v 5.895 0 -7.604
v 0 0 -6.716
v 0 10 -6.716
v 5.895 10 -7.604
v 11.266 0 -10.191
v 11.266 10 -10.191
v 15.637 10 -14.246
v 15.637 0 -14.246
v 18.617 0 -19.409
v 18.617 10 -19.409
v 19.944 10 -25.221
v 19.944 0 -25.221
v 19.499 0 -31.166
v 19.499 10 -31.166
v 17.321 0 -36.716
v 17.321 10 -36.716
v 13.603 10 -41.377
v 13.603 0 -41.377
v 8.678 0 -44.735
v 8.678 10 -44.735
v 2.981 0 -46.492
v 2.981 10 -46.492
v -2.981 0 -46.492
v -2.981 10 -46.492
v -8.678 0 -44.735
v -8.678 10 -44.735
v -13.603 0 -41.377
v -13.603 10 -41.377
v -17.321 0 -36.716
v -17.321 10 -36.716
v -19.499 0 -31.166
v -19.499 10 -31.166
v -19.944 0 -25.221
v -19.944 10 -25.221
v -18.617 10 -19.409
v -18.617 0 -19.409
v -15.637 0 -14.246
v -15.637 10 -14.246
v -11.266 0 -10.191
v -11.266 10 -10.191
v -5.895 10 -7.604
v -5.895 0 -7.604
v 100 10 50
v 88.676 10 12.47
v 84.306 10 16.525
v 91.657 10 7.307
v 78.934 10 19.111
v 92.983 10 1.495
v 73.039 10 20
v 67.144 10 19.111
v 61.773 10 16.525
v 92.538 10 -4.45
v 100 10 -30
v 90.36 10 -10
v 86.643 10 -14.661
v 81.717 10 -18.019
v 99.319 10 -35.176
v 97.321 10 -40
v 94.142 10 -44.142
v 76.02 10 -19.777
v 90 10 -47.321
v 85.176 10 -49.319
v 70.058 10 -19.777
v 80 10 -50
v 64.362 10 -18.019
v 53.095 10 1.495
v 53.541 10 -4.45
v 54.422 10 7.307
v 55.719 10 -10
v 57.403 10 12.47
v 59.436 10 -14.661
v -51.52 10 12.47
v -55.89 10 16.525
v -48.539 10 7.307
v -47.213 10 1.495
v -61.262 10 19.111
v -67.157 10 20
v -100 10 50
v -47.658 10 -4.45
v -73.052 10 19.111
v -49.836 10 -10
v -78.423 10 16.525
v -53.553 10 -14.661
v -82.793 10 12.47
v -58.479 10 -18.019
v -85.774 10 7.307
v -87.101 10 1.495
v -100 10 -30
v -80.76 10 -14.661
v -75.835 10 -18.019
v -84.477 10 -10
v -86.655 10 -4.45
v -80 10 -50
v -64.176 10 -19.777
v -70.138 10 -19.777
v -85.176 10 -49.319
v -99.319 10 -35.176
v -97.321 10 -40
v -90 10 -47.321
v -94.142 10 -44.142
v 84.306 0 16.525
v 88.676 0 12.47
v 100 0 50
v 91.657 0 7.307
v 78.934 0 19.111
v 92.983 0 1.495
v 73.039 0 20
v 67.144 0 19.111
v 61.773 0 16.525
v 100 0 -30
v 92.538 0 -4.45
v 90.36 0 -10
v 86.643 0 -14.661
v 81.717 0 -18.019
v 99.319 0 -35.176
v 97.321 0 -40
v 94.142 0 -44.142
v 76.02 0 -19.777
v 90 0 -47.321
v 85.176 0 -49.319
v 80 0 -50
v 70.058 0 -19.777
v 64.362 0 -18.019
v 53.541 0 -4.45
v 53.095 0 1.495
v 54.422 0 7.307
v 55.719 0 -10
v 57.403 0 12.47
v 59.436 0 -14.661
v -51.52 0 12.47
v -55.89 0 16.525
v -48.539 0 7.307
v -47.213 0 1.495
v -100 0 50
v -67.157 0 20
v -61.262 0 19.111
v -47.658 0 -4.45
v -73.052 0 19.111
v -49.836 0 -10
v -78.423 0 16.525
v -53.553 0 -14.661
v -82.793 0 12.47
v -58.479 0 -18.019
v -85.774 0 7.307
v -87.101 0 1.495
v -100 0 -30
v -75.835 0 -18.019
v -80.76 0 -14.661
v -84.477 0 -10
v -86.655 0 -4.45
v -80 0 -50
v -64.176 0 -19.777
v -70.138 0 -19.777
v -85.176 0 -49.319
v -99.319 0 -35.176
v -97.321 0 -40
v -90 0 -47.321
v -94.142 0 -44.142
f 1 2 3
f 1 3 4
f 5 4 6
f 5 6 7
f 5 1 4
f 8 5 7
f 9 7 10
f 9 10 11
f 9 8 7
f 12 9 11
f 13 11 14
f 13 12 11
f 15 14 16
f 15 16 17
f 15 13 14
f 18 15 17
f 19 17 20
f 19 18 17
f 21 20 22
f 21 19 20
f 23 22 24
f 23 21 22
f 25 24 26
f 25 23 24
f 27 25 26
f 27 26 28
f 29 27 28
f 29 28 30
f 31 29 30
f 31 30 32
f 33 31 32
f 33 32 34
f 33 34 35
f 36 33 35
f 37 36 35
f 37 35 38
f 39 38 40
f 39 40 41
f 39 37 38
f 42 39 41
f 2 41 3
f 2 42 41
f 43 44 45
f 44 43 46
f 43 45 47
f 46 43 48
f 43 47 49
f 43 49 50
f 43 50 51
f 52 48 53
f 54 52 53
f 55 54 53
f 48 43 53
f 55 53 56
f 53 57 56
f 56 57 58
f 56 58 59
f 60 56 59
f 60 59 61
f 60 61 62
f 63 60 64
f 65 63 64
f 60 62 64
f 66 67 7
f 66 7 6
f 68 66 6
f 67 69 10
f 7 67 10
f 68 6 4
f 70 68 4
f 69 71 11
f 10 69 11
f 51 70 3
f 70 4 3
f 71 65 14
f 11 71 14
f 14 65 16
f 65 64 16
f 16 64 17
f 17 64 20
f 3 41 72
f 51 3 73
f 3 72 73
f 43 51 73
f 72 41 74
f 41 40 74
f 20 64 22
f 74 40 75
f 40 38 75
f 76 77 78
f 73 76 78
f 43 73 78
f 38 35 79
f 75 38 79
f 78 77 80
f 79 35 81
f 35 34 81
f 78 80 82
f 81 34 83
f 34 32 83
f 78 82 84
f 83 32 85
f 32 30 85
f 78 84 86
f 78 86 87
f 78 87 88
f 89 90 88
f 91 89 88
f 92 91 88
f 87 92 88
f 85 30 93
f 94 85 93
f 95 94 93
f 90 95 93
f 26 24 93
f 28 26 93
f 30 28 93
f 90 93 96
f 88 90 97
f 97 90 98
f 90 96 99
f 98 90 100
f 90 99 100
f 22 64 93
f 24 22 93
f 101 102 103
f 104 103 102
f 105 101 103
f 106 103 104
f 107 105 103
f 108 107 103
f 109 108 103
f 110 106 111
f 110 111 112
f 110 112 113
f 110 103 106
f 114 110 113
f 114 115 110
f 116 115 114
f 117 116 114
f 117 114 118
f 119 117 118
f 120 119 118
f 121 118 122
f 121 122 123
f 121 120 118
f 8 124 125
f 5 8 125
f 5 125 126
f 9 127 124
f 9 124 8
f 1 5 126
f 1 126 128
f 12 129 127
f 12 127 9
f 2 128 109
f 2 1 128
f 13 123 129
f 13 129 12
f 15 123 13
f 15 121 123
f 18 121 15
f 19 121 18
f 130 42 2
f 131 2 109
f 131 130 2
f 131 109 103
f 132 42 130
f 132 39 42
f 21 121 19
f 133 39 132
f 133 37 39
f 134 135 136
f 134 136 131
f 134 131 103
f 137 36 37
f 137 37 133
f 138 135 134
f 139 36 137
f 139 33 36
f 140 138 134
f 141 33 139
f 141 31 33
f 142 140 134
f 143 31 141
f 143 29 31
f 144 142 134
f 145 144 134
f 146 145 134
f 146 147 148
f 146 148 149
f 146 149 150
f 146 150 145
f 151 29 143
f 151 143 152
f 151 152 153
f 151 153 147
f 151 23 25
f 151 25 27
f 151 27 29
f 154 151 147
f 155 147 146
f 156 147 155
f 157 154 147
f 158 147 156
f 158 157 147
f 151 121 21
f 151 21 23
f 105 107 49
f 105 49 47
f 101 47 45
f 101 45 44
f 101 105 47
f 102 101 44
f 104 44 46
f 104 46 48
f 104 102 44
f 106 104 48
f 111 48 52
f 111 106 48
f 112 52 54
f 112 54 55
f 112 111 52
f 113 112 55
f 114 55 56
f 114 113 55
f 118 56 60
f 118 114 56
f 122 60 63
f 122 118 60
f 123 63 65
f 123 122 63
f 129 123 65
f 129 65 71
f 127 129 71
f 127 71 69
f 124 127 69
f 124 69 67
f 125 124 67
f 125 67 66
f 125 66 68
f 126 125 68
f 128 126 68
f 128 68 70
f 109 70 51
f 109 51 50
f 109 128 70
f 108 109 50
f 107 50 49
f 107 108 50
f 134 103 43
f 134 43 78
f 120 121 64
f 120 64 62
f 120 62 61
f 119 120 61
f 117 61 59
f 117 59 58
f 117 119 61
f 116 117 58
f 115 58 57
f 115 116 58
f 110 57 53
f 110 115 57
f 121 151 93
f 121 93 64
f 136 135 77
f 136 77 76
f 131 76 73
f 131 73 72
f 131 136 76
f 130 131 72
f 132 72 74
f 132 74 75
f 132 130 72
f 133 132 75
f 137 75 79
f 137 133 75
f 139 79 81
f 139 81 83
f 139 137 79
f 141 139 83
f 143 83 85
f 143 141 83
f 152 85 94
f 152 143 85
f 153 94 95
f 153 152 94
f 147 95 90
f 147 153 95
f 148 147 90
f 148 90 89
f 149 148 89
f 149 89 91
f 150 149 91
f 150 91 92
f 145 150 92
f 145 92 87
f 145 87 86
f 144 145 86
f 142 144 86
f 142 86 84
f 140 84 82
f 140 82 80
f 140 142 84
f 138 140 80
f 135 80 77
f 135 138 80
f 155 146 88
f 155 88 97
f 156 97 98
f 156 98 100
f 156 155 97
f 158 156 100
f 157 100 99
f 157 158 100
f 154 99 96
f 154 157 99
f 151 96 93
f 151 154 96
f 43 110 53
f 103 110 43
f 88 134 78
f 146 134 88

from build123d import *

# Parameters (mm, degrees)
SKETCH1_R           = 20
BOSS_EXTRUDE3_DEPTH = 10


with BuildPart() as part:
    # Sketch1 → Boss-Extrude3 (new body)
    with BuildSketch(Plane(origin=(0, 0, 0), x_dir=(1, 0, 0), z_dir=(0, 1, 0))):
        with BuildLine():
            Line((-80, 50), (80, 50))
            ThreePointArc((80, 50), (94.142135624, 44.142135624), (100, 30))
            Line((100, 30), (100, -50))
            Line((100, -50), (-100, -50))
            Line((-100, -50), (-100, 30))
            ThreePointArc((-100, 30), (-94.142135624, 44.142135624), (-80, 50))
        make_face()
        with Locations(Location((0, 26.715686275, 0), (0, 0, 270))):
            Circle(SKETCH1_R, mode=Mode.SUBTRACT)
        with Locations(Location((73.039215686, 0, 0), (0, 0, 270))):
            Circle(SKETCH1_R, mode=Mode.SUBTRACT)
        with Locations(Location((-67.156862745, 0, 0), (0, 0, 270))):
            Circle(SKETCH1_R, mode=Mode.SUBTRACT)
    extrude(amount=BOSS_EXTRUDE3_DEPTH)


solid = part.part
